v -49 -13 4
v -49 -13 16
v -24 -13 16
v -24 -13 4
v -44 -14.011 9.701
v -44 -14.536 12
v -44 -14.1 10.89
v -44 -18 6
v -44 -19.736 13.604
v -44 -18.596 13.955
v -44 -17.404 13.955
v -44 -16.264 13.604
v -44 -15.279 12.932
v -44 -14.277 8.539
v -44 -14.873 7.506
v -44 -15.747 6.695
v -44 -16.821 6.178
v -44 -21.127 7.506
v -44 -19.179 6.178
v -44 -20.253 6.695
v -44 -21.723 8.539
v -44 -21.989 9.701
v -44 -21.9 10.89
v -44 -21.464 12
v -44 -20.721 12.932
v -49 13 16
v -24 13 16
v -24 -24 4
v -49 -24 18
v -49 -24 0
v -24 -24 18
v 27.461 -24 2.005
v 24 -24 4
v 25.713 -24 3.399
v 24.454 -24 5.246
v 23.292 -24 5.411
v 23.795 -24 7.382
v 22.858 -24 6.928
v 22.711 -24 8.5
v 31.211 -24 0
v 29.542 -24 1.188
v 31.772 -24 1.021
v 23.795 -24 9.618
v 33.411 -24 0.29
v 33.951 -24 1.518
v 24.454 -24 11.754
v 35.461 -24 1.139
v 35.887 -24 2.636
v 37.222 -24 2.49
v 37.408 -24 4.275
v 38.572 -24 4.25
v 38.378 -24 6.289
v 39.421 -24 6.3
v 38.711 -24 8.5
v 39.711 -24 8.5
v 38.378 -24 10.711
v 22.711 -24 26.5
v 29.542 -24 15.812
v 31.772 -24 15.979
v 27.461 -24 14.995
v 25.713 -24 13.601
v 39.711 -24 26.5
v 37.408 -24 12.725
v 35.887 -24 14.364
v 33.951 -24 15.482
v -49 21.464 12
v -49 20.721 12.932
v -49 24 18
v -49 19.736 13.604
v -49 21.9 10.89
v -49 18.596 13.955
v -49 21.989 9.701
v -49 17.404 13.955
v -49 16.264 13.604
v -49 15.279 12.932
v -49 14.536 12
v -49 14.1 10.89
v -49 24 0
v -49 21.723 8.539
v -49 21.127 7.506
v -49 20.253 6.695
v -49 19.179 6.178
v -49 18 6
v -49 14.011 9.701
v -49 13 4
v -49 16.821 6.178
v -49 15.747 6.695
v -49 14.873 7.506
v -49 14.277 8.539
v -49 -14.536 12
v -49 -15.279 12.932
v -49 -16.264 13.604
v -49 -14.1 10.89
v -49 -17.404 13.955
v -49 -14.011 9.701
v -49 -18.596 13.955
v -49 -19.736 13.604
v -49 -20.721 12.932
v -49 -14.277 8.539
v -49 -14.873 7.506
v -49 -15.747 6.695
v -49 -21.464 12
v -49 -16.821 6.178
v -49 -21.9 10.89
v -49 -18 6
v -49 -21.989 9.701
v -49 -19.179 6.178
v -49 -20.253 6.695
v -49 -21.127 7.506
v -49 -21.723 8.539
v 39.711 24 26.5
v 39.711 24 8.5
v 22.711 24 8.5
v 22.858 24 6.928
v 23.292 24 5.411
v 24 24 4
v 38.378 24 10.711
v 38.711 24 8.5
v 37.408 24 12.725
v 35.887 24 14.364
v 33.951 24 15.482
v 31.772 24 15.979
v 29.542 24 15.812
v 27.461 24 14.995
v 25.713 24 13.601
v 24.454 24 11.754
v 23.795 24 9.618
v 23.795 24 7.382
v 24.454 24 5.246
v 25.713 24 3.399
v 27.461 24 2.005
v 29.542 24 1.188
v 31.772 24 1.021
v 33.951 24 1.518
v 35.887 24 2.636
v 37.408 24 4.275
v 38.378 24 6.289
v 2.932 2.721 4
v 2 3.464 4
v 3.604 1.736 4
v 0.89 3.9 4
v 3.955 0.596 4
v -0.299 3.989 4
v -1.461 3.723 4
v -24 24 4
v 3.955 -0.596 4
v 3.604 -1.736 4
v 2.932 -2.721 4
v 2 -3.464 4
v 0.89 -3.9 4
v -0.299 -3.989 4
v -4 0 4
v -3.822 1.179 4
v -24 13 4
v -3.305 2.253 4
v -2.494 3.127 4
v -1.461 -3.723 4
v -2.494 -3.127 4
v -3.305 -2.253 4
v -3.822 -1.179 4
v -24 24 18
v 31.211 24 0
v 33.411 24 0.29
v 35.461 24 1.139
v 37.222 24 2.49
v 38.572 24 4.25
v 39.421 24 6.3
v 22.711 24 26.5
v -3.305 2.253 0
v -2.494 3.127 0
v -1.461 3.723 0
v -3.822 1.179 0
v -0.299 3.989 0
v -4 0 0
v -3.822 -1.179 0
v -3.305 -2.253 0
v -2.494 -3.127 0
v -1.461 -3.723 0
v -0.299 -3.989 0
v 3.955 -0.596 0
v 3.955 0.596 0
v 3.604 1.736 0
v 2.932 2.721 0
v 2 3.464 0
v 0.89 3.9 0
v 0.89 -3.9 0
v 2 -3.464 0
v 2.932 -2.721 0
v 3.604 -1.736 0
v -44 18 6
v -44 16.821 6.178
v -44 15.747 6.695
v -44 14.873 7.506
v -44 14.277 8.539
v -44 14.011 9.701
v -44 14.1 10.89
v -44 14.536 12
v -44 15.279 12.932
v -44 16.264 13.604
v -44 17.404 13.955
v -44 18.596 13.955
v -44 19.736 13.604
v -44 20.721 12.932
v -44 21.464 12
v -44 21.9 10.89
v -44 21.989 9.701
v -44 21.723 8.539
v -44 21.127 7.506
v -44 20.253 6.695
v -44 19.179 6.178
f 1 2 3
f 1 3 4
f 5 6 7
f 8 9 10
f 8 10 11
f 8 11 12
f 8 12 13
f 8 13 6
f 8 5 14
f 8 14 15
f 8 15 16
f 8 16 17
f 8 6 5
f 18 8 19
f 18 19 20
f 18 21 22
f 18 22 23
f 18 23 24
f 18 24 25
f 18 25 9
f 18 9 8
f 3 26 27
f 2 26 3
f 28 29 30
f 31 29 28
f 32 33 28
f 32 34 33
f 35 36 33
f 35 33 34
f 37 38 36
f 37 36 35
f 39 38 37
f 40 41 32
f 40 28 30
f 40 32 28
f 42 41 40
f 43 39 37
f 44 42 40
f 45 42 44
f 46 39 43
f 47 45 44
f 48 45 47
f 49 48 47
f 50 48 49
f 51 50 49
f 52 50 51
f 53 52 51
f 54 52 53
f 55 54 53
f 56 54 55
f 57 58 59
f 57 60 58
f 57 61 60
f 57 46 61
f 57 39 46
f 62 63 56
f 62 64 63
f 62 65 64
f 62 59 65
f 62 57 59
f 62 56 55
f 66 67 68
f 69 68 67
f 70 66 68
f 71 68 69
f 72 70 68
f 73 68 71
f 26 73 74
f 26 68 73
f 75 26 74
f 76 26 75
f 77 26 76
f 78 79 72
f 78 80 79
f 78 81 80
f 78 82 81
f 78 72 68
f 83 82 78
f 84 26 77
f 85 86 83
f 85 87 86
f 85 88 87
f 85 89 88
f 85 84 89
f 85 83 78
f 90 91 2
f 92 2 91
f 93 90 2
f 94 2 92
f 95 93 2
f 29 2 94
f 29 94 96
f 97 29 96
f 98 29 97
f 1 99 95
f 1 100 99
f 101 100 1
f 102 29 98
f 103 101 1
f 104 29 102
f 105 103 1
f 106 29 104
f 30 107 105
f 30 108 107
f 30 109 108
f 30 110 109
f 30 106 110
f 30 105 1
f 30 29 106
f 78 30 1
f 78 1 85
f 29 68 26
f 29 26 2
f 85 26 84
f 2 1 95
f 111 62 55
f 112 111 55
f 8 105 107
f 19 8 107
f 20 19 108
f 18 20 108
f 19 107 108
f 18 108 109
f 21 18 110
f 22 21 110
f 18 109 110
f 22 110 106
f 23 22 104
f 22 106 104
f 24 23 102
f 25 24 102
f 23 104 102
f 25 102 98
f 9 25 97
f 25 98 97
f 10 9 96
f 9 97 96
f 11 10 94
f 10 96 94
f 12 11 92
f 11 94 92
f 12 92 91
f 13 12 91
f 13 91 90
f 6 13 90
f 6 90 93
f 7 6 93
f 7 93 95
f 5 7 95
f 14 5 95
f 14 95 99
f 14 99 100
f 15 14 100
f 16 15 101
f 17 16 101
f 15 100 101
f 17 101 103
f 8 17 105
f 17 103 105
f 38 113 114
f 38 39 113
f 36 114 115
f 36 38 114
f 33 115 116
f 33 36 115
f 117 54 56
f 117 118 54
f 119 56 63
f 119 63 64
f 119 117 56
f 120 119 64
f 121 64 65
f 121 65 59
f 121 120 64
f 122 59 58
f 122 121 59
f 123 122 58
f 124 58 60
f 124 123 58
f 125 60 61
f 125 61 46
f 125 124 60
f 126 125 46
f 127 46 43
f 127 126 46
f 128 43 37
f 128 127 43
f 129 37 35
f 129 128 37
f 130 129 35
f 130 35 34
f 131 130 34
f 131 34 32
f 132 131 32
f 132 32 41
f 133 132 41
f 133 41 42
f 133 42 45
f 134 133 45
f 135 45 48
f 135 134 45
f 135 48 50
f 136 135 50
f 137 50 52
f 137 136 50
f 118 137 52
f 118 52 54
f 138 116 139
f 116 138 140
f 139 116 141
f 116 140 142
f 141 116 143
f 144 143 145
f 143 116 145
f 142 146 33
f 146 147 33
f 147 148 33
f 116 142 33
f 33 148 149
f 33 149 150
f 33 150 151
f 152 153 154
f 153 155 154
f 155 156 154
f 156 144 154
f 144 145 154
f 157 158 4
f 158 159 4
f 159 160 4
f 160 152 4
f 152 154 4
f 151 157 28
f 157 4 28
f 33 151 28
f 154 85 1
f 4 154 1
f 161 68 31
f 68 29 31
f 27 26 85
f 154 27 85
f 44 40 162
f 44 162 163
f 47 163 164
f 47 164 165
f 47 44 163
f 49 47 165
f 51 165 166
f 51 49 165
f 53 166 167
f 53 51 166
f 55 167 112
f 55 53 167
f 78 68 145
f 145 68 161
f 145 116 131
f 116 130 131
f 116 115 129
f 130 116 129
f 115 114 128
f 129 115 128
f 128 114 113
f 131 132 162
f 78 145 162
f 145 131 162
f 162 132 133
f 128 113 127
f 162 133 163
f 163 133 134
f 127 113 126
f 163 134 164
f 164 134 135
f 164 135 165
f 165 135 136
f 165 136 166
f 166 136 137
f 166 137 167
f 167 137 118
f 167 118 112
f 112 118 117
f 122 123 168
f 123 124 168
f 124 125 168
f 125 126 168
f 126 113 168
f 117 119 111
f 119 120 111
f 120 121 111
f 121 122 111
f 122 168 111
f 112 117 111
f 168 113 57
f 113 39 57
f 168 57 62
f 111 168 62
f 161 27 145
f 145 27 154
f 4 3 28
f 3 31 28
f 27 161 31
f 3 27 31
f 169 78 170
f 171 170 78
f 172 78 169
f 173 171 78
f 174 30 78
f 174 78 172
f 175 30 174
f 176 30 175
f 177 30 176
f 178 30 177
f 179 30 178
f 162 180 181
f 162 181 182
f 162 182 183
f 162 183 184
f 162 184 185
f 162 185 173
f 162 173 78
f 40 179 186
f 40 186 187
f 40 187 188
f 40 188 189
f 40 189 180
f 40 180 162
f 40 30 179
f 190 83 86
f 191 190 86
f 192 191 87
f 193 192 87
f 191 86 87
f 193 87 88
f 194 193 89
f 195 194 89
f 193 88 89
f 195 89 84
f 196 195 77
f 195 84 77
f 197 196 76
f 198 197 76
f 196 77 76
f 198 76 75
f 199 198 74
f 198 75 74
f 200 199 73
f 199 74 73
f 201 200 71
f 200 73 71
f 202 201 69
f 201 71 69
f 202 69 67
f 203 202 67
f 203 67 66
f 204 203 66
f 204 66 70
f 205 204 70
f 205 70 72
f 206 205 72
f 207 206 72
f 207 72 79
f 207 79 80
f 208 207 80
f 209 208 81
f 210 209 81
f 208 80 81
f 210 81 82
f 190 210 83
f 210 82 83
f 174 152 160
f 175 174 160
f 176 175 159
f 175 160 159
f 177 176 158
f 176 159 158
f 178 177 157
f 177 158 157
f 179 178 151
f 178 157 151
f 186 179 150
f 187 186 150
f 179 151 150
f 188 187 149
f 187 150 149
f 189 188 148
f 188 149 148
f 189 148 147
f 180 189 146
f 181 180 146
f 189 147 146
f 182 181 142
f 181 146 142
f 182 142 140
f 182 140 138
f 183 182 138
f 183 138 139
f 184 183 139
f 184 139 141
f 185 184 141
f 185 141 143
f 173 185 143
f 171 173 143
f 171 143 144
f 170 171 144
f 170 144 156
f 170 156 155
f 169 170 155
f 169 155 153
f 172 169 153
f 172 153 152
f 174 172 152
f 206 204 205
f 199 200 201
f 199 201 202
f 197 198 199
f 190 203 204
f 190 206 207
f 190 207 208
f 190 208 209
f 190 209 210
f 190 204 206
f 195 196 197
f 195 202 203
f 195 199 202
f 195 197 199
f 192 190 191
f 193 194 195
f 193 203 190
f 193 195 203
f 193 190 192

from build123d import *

# Parameters (mm, degrees)
SKETCH_R           = 7.5
PAD_DEPTH          = 24
SKETCH001_R        = 4
POCKET_DEPTH       = 5
POLARPATTERN_COUNT = 2
SKETCH002_W        = 12
SKETCH002_H        = 26
POCKET001_DEPTH    = 25
SKETCH004_R        = 4
POCKET002_DEPTH    = 5


with BuildPart() as part:
    # Sketch → Pad (new body, symmetric)
    with BuildSketch(Plane.XZ):
        with BuildLine():
            Line((-49, 18), (-49, 0))
            Line((-49, 0), (31.211103, 0))
            ThreePointArc((31.211103, 0), (37.22151, 2.489592), (39.711103, 8.5))
            Line((39.711103, 26.499979), (39.711103, 8.5))
            Line((22.711103, 26.499979), (39.711103, 26.499979))
            Line((22.711103, 8.499979), (22.711103, 26.499979))
            ThreePointArc((22.711103, 8.499979), (23.03968, 6.159517), (24, 4))
            Line((-24, 4), (24, 4))
            Line((-24, 18), (-24, 4))
            Line((-49, 18), (-24, 18))
        make_face()
        with Locations((31.211103, 8.5)):
            Circle(SKETCH_R, mode=Mode.SUBTRACT)
    extrude(amount=PAD_DEPTH, both=True)

    # Sketch001 → Pocket (cut)
    with BuildSketch(Plane(origin=(0, 0, 4), x_dir=(-1, 0, 0), z_dir=(0, 0, 1))):
        Circle(SKETCH001_R)
    pocket = extrude(amount=-POCKET_DEPTH, mode=Mode.SUBTRACT)

    # PolarPattern: Pocket ×2 about axis
    polarpattern_axis = Axis((0, 0, 4), (0, 0, 1))
    for i in range(1, POLARPATTERN_COUNT):
        add(pocket.rotate(polarpattern_axis, i * 360 / POLARPATTERN_COUNT), mode=Mode.SUBTRACT)

    # Sketch002 → Pocket001 (cut)
    with BuildSketch(Plane(origin=(-49, 0, 0), x_dir=(0, 0, -1), z_dir=(-1, 0, 0))):
        with Locations((-10, 0)):
            Rectangle(SKETCH002_W, SKETCH002_H)
    extrude(amount=-POCKET001_DEPTH, mode=Mode.SUBTRACT)

    # Sketch004 → Pocket002 (cut)
    with BuildSketch(Plane(origin=(-49, 0, 0), x_dir=(0, 0, -1), z_dir=(-1, 0, 0))):
        with Locations((-10, -18)):
            Circle(SKETCH004_R)
        with Locations((-10, 18)):
            Circle(SKETCH004_R)
    extrude(amount=-POCKET002_DEPTH, mode=Mode.SUBTRACT)


solid = part.part
